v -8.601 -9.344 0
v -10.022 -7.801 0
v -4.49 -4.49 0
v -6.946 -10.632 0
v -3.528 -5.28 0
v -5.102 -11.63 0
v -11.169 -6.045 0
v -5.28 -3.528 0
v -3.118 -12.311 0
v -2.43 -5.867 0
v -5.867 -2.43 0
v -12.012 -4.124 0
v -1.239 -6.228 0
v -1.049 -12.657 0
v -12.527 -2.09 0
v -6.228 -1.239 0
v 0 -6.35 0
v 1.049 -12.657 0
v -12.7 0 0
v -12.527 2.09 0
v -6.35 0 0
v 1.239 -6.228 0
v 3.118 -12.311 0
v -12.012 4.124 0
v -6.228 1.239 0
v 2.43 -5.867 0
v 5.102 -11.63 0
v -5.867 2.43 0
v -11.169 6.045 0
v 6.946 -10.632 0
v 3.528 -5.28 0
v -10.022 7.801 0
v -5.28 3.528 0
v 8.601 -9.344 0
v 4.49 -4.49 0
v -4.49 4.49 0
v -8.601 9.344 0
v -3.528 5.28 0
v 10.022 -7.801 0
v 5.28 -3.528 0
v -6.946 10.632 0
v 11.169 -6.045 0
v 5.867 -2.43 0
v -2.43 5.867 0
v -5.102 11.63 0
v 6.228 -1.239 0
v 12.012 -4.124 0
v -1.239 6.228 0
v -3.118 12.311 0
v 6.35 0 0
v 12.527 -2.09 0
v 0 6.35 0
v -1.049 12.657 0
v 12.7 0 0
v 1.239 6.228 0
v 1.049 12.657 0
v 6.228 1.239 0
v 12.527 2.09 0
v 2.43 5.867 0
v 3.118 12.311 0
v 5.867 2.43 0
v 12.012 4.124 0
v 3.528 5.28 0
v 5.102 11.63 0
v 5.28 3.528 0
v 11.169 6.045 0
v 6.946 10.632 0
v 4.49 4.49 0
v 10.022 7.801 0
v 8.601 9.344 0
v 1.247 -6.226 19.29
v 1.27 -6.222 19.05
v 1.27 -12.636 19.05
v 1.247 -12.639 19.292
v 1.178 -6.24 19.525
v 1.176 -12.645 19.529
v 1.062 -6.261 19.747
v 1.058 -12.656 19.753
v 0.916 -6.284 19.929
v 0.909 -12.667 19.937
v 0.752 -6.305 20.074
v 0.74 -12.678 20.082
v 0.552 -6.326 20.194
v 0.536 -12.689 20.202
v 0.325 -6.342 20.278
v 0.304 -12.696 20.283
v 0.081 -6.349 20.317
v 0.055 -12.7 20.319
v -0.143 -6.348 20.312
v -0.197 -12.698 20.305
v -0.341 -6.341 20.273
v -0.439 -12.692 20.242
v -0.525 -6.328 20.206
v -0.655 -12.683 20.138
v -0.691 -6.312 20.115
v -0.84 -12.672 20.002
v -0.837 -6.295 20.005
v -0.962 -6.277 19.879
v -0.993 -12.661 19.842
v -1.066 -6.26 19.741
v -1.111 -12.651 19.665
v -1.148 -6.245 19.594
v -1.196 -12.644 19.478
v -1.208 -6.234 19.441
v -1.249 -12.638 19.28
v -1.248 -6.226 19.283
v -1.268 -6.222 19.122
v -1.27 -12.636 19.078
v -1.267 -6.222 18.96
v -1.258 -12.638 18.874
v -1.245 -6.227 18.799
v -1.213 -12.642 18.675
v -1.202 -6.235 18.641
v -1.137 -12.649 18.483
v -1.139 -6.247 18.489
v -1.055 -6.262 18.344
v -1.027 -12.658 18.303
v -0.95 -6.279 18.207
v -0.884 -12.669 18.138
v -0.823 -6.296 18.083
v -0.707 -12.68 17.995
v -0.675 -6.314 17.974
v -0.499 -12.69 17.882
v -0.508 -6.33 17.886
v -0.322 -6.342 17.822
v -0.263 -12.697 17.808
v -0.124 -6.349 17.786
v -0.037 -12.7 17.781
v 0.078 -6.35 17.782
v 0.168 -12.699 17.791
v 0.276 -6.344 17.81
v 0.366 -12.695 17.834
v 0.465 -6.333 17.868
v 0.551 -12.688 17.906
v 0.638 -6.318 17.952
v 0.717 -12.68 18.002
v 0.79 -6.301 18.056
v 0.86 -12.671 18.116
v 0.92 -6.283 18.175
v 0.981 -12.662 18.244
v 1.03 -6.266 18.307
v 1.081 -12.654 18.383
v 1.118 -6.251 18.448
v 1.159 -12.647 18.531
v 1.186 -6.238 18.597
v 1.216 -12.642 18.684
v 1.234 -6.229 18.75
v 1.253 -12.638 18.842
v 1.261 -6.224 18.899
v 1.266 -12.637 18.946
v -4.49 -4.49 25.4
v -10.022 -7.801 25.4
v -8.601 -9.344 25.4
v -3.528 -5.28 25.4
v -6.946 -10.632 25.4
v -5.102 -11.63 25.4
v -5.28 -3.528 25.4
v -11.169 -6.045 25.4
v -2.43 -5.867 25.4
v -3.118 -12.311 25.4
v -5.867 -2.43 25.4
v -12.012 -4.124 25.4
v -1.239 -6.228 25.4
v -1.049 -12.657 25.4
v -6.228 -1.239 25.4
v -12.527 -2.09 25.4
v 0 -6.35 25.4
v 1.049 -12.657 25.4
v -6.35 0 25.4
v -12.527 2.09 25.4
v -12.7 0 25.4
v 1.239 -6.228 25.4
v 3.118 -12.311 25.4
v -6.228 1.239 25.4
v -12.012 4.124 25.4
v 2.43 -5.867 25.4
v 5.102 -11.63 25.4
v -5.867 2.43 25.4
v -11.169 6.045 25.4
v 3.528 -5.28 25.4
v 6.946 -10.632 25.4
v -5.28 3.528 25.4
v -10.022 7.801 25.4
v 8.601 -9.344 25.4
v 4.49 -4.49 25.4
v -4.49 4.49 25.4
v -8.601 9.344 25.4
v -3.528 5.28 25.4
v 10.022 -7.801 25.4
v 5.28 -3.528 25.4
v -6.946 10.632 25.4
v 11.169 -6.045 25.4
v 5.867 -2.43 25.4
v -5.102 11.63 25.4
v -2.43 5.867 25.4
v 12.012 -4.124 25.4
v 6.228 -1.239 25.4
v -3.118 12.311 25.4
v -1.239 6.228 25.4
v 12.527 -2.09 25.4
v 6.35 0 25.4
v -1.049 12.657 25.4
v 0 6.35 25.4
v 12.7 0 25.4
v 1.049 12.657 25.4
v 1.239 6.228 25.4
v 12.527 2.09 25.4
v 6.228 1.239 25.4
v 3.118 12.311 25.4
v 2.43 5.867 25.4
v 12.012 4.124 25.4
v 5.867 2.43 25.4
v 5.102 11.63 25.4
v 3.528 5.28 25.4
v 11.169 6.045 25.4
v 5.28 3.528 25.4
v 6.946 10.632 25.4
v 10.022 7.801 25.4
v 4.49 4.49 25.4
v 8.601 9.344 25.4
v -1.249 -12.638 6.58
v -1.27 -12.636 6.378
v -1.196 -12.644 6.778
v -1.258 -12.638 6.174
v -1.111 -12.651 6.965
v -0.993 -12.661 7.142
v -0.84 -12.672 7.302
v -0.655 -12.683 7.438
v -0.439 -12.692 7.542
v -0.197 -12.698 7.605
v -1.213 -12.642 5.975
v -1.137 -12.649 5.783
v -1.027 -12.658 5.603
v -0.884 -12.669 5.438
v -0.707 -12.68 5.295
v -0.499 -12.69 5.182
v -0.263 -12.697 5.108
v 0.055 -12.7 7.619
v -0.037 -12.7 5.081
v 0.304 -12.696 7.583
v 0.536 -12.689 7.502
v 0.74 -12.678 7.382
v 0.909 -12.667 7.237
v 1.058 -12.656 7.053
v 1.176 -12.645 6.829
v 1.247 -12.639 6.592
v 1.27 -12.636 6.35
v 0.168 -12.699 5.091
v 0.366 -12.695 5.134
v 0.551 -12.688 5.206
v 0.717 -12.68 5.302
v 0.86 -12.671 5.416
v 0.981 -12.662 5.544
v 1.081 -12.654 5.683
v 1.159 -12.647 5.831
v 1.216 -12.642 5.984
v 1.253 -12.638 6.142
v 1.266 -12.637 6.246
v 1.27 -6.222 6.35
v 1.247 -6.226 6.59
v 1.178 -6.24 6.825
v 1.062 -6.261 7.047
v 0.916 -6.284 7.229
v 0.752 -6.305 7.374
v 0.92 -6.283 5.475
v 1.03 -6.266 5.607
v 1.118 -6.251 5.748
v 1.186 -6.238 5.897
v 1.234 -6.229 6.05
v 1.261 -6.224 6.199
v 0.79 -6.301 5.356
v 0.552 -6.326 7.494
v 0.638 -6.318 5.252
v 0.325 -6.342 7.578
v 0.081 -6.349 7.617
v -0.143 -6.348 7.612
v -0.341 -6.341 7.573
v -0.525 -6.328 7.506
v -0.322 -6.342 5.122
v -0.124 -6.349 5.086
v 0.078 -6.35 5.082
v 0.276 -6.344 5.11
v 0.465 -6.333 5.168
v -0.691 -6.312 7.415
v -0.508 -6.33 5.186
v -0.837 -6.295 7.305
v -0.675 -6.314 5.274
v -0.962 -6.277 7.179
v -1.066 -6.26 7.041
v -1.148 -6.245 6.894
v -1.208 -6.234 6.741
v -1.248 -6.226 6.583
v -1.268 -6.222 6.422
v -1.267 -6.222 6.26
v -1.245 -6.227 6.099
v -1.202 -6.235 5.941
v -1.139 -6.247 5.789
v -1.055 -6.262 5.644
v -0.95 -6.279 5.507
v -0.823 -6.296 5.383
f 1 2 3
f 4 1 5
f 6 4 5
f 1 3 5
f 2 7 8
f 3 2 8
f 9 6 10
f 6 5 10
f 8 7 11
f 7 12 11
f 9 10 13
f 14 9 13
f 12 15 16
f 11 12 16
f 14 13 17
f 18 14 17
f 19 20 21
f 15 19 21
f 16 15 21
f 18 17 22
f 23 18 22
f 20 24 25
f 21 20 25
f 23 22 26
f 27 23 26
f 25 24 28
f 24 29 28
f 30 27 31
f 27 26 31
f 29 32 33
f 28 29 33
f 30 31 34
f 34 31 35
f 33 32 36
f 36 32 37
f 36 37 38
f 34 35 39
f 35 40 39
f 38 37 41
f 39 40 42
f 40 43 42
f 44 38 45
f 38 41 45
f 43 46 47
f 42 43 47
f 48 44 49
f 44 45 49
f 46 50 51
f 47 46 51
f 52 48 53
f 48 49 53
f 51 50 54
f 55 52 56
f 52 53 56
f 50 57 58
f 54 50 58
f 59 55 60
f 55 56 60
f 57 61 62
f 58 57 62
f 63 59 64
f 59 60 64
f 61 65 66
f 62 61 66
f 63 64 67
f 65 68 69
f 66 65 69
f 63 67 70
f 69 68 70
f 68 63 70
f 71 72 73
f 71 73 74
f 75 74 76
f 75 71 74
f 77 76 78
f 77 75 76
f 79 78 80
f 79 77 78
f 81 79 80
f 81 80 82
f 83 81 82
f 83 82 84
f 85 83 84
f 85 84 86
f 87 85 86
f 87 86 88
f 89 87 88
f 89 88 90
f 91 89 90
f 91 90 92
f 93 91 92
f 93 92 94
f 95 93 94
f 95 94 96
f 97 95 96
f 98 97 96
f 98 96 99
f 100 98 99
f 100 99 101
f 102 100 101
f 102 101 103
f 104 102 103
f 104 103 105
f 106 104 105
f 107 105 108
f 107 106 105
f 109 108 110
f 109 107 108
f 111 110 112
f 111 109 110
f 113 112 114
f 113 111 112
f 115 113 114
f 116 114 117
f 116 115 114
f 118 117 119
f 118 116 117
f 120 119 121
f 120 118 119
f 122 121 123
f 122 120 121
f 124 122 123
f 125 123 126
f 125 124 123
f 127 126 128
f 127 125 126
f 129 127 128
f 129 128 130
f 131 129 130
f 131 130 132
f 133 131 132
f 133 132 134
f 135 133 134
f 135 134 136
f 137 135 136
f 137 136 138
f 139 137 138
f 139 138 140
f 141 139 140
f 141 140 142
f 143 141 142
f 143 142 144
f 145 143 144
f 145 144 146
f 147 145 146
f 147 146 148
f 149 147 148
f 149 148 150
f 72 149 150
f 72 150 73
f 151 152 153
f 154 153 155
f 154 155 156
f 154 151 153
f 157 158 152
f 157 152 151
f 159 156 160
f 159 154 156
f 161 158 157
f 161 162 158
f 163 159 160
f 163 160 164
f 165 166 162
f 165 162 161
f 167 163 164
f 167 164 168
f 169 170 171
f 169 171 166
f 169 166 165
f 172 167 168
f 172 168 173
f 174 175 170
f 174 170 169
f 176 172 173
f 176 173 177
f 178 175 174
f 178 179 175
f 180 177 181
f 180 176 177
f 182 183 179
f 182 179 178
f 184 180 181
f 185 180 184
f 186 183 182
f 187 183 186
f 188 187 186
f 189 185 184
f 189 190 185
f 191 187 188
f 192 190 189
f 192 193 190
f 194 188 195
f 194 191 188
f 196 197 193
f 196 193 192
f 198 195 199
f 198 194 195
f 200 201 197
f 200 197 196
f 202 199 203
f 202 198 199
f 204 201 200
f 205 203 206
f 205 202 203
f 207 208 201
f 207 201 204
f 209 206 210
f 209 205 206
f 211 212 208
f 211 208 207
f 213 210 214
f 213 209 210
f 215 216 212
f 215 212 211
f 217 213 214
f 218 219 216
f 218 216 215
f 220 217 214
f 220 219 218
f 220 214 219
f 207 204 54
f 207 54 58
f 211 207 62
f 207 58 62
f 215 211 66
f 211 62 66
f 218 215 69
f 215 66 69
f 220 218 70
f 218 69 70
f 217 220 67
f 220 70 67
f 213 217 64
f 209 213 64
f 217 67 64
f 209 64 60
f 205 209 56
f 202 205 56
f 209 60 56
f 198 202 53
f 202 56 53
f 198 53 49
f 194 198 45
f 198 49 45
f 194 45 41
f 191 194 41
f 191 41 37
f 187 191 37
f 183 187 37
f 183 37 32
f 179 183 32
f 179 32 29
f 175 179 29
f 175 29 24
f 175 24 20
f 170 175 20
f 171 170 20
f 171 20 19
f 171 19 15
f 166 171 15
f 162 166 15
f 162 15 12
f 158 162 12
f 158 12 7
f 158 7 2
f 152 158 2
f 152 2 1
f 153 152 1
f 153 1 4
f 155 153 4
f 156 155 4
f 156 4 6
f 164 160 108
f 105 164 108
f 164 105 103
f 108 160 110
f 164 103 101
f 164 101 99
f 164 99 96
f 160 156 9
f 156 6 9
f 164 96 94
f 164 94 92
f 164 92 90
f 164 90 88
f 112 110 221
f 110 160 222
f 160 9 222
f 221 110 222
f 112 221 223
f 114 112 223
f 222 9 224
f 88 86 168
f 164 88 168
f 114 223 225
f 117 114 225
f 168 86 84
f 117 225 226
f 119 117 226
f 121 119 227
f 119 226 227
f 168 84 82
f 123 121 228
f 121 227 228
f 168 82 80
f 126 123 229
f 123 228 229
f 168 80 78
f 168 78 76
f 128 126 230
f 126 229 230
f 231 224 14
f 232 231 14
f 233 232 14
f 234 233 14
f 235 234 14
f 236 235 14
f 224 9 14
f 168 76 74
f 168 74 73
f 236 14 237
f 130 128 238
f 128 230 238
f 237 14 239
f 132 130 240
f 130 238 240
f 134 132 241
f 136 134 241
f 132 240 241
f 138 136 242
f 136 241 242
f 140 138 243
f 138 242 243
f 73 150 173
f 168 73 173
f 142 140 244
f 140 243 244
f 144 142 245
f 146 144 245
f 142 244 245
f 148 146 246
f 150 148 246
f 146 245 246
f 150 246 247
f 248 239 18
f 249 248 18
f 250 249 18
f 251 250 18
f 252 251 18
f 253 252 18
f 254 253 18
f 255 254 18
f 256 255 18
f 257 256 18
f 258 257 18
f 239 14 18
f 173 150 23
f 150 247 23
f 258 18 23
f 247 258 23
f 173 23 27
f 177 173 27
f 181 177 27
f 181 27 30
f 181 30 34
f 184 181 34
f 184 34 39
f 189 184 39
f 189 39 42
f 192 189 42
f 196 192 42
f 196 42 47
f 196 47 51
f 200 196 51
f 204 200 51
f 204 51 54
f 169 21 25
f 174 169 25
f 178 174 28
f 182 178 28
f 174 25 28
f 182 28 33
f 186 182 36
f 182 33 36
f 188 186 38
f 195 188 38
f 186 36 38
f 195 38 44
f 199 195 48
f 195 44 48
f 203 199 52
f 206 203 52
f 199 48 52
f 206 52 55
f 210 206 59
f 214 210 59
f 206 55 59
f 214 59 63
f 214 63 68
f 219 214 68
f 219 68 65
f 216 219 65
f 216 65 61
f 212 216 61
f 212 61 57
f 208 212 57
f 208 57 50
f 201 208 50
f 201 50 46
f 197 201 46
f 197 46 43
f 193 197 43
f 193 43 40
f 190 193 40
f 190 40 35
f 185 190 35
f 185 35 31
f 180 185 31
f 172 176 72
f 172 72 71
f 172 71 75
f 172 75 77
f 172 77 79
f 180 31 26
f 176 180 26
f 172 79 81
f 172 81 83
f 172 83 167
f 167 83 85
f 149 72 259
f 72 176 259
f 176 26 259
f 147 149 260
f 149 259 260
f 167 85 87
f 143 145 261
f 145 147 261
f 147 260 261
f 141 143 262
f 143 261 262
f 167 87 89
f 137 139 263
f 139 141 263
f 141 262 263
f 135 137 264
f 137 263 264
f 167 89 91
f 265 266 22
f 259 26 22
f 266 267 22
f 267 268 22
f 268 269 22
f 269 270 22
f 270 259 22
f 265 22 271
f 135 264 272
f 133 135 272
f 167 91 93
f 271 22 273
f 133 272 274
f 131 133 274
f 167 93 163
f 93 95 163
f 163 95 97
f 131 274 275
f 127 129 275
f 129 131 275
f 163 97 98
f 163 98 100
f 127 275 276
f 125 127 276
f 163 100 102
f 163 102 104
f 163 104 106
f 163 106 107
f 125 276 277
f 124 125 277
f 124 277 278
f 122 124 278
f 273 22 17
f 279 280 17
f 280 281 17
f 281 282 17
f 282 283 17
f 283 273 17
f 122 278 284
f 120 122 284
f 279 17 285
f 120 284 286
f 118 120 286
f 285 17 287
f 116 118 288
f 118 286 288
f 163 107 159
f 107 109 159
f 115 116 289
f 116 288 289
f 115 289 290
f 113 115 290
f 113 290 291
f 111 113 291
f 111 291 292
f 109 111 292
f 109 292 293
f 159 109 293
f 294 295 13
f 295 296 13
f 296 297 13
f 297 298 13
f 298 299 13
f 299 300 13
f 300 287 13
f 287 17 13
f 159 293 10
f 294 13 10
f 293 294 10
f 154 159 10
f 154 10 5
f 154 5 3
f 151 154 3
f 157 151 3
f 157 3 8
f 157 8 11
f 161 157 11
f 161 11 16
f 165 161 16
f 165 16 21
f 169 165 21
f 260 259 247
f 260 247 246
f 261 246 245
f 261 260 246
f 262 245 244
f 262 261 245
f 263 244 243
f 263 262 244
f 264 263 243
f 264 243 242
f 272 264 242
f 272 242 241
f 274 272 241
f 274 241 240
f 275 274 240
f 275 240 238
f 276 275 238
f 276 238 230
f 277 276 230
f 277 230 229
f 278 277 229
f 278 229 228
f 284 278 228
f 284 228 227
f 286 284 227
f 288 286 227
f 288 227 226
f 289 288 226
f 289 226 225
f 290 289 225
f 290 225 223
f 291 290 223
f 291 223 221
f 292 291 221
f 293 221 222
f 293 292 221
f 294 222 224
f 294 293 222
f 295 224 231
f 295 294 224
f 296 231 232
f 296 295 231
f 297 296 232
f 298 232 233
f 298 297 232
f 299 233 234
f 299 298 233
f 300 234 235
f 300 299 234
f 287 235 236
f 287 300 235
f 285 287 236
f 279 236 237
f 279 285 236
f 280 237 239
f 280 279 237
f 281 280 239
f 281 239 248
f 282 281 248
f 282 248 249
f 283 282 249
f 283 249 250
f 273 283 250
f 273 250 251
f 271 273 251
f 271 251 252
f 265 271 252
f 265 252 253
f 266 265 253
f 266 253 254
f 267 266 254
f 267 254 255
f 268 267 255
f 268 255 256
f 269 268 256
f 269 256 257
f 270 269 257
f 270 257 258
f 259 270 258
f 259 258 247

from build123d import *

# Parameters (mm, degrees)
F0_R     = 12.7
F1_DEPTH = 25.4
F3_D     = 12.7
F4_R     = 1.27
F5_DEPTH = 12.701


with BuildPart() as f1:
    # F0 (on Top) → F1 (new body)
    with BuildSketch(Plane.XY):
        Circle(F0_R)
    extrude(amount=F1_DEPTH)

    # F3 (through all)
    with Locations(Plane.XY.offset(25.4)):
        with Locations((0, 0)):
            Hole(F3_D / 2)

    # F4 (on Front) → F5 (cut, through all)
    with BuildSketch(Plane.XZ):
        with Locations((0, 6.35)):
            Circle(F4_R)
        with Locations((0, 19.05)):
            Circle(F4_R)
    extrude(amount=F5_DEPTH, mode=Mode.SUBTRACT)


solid = f1.part
